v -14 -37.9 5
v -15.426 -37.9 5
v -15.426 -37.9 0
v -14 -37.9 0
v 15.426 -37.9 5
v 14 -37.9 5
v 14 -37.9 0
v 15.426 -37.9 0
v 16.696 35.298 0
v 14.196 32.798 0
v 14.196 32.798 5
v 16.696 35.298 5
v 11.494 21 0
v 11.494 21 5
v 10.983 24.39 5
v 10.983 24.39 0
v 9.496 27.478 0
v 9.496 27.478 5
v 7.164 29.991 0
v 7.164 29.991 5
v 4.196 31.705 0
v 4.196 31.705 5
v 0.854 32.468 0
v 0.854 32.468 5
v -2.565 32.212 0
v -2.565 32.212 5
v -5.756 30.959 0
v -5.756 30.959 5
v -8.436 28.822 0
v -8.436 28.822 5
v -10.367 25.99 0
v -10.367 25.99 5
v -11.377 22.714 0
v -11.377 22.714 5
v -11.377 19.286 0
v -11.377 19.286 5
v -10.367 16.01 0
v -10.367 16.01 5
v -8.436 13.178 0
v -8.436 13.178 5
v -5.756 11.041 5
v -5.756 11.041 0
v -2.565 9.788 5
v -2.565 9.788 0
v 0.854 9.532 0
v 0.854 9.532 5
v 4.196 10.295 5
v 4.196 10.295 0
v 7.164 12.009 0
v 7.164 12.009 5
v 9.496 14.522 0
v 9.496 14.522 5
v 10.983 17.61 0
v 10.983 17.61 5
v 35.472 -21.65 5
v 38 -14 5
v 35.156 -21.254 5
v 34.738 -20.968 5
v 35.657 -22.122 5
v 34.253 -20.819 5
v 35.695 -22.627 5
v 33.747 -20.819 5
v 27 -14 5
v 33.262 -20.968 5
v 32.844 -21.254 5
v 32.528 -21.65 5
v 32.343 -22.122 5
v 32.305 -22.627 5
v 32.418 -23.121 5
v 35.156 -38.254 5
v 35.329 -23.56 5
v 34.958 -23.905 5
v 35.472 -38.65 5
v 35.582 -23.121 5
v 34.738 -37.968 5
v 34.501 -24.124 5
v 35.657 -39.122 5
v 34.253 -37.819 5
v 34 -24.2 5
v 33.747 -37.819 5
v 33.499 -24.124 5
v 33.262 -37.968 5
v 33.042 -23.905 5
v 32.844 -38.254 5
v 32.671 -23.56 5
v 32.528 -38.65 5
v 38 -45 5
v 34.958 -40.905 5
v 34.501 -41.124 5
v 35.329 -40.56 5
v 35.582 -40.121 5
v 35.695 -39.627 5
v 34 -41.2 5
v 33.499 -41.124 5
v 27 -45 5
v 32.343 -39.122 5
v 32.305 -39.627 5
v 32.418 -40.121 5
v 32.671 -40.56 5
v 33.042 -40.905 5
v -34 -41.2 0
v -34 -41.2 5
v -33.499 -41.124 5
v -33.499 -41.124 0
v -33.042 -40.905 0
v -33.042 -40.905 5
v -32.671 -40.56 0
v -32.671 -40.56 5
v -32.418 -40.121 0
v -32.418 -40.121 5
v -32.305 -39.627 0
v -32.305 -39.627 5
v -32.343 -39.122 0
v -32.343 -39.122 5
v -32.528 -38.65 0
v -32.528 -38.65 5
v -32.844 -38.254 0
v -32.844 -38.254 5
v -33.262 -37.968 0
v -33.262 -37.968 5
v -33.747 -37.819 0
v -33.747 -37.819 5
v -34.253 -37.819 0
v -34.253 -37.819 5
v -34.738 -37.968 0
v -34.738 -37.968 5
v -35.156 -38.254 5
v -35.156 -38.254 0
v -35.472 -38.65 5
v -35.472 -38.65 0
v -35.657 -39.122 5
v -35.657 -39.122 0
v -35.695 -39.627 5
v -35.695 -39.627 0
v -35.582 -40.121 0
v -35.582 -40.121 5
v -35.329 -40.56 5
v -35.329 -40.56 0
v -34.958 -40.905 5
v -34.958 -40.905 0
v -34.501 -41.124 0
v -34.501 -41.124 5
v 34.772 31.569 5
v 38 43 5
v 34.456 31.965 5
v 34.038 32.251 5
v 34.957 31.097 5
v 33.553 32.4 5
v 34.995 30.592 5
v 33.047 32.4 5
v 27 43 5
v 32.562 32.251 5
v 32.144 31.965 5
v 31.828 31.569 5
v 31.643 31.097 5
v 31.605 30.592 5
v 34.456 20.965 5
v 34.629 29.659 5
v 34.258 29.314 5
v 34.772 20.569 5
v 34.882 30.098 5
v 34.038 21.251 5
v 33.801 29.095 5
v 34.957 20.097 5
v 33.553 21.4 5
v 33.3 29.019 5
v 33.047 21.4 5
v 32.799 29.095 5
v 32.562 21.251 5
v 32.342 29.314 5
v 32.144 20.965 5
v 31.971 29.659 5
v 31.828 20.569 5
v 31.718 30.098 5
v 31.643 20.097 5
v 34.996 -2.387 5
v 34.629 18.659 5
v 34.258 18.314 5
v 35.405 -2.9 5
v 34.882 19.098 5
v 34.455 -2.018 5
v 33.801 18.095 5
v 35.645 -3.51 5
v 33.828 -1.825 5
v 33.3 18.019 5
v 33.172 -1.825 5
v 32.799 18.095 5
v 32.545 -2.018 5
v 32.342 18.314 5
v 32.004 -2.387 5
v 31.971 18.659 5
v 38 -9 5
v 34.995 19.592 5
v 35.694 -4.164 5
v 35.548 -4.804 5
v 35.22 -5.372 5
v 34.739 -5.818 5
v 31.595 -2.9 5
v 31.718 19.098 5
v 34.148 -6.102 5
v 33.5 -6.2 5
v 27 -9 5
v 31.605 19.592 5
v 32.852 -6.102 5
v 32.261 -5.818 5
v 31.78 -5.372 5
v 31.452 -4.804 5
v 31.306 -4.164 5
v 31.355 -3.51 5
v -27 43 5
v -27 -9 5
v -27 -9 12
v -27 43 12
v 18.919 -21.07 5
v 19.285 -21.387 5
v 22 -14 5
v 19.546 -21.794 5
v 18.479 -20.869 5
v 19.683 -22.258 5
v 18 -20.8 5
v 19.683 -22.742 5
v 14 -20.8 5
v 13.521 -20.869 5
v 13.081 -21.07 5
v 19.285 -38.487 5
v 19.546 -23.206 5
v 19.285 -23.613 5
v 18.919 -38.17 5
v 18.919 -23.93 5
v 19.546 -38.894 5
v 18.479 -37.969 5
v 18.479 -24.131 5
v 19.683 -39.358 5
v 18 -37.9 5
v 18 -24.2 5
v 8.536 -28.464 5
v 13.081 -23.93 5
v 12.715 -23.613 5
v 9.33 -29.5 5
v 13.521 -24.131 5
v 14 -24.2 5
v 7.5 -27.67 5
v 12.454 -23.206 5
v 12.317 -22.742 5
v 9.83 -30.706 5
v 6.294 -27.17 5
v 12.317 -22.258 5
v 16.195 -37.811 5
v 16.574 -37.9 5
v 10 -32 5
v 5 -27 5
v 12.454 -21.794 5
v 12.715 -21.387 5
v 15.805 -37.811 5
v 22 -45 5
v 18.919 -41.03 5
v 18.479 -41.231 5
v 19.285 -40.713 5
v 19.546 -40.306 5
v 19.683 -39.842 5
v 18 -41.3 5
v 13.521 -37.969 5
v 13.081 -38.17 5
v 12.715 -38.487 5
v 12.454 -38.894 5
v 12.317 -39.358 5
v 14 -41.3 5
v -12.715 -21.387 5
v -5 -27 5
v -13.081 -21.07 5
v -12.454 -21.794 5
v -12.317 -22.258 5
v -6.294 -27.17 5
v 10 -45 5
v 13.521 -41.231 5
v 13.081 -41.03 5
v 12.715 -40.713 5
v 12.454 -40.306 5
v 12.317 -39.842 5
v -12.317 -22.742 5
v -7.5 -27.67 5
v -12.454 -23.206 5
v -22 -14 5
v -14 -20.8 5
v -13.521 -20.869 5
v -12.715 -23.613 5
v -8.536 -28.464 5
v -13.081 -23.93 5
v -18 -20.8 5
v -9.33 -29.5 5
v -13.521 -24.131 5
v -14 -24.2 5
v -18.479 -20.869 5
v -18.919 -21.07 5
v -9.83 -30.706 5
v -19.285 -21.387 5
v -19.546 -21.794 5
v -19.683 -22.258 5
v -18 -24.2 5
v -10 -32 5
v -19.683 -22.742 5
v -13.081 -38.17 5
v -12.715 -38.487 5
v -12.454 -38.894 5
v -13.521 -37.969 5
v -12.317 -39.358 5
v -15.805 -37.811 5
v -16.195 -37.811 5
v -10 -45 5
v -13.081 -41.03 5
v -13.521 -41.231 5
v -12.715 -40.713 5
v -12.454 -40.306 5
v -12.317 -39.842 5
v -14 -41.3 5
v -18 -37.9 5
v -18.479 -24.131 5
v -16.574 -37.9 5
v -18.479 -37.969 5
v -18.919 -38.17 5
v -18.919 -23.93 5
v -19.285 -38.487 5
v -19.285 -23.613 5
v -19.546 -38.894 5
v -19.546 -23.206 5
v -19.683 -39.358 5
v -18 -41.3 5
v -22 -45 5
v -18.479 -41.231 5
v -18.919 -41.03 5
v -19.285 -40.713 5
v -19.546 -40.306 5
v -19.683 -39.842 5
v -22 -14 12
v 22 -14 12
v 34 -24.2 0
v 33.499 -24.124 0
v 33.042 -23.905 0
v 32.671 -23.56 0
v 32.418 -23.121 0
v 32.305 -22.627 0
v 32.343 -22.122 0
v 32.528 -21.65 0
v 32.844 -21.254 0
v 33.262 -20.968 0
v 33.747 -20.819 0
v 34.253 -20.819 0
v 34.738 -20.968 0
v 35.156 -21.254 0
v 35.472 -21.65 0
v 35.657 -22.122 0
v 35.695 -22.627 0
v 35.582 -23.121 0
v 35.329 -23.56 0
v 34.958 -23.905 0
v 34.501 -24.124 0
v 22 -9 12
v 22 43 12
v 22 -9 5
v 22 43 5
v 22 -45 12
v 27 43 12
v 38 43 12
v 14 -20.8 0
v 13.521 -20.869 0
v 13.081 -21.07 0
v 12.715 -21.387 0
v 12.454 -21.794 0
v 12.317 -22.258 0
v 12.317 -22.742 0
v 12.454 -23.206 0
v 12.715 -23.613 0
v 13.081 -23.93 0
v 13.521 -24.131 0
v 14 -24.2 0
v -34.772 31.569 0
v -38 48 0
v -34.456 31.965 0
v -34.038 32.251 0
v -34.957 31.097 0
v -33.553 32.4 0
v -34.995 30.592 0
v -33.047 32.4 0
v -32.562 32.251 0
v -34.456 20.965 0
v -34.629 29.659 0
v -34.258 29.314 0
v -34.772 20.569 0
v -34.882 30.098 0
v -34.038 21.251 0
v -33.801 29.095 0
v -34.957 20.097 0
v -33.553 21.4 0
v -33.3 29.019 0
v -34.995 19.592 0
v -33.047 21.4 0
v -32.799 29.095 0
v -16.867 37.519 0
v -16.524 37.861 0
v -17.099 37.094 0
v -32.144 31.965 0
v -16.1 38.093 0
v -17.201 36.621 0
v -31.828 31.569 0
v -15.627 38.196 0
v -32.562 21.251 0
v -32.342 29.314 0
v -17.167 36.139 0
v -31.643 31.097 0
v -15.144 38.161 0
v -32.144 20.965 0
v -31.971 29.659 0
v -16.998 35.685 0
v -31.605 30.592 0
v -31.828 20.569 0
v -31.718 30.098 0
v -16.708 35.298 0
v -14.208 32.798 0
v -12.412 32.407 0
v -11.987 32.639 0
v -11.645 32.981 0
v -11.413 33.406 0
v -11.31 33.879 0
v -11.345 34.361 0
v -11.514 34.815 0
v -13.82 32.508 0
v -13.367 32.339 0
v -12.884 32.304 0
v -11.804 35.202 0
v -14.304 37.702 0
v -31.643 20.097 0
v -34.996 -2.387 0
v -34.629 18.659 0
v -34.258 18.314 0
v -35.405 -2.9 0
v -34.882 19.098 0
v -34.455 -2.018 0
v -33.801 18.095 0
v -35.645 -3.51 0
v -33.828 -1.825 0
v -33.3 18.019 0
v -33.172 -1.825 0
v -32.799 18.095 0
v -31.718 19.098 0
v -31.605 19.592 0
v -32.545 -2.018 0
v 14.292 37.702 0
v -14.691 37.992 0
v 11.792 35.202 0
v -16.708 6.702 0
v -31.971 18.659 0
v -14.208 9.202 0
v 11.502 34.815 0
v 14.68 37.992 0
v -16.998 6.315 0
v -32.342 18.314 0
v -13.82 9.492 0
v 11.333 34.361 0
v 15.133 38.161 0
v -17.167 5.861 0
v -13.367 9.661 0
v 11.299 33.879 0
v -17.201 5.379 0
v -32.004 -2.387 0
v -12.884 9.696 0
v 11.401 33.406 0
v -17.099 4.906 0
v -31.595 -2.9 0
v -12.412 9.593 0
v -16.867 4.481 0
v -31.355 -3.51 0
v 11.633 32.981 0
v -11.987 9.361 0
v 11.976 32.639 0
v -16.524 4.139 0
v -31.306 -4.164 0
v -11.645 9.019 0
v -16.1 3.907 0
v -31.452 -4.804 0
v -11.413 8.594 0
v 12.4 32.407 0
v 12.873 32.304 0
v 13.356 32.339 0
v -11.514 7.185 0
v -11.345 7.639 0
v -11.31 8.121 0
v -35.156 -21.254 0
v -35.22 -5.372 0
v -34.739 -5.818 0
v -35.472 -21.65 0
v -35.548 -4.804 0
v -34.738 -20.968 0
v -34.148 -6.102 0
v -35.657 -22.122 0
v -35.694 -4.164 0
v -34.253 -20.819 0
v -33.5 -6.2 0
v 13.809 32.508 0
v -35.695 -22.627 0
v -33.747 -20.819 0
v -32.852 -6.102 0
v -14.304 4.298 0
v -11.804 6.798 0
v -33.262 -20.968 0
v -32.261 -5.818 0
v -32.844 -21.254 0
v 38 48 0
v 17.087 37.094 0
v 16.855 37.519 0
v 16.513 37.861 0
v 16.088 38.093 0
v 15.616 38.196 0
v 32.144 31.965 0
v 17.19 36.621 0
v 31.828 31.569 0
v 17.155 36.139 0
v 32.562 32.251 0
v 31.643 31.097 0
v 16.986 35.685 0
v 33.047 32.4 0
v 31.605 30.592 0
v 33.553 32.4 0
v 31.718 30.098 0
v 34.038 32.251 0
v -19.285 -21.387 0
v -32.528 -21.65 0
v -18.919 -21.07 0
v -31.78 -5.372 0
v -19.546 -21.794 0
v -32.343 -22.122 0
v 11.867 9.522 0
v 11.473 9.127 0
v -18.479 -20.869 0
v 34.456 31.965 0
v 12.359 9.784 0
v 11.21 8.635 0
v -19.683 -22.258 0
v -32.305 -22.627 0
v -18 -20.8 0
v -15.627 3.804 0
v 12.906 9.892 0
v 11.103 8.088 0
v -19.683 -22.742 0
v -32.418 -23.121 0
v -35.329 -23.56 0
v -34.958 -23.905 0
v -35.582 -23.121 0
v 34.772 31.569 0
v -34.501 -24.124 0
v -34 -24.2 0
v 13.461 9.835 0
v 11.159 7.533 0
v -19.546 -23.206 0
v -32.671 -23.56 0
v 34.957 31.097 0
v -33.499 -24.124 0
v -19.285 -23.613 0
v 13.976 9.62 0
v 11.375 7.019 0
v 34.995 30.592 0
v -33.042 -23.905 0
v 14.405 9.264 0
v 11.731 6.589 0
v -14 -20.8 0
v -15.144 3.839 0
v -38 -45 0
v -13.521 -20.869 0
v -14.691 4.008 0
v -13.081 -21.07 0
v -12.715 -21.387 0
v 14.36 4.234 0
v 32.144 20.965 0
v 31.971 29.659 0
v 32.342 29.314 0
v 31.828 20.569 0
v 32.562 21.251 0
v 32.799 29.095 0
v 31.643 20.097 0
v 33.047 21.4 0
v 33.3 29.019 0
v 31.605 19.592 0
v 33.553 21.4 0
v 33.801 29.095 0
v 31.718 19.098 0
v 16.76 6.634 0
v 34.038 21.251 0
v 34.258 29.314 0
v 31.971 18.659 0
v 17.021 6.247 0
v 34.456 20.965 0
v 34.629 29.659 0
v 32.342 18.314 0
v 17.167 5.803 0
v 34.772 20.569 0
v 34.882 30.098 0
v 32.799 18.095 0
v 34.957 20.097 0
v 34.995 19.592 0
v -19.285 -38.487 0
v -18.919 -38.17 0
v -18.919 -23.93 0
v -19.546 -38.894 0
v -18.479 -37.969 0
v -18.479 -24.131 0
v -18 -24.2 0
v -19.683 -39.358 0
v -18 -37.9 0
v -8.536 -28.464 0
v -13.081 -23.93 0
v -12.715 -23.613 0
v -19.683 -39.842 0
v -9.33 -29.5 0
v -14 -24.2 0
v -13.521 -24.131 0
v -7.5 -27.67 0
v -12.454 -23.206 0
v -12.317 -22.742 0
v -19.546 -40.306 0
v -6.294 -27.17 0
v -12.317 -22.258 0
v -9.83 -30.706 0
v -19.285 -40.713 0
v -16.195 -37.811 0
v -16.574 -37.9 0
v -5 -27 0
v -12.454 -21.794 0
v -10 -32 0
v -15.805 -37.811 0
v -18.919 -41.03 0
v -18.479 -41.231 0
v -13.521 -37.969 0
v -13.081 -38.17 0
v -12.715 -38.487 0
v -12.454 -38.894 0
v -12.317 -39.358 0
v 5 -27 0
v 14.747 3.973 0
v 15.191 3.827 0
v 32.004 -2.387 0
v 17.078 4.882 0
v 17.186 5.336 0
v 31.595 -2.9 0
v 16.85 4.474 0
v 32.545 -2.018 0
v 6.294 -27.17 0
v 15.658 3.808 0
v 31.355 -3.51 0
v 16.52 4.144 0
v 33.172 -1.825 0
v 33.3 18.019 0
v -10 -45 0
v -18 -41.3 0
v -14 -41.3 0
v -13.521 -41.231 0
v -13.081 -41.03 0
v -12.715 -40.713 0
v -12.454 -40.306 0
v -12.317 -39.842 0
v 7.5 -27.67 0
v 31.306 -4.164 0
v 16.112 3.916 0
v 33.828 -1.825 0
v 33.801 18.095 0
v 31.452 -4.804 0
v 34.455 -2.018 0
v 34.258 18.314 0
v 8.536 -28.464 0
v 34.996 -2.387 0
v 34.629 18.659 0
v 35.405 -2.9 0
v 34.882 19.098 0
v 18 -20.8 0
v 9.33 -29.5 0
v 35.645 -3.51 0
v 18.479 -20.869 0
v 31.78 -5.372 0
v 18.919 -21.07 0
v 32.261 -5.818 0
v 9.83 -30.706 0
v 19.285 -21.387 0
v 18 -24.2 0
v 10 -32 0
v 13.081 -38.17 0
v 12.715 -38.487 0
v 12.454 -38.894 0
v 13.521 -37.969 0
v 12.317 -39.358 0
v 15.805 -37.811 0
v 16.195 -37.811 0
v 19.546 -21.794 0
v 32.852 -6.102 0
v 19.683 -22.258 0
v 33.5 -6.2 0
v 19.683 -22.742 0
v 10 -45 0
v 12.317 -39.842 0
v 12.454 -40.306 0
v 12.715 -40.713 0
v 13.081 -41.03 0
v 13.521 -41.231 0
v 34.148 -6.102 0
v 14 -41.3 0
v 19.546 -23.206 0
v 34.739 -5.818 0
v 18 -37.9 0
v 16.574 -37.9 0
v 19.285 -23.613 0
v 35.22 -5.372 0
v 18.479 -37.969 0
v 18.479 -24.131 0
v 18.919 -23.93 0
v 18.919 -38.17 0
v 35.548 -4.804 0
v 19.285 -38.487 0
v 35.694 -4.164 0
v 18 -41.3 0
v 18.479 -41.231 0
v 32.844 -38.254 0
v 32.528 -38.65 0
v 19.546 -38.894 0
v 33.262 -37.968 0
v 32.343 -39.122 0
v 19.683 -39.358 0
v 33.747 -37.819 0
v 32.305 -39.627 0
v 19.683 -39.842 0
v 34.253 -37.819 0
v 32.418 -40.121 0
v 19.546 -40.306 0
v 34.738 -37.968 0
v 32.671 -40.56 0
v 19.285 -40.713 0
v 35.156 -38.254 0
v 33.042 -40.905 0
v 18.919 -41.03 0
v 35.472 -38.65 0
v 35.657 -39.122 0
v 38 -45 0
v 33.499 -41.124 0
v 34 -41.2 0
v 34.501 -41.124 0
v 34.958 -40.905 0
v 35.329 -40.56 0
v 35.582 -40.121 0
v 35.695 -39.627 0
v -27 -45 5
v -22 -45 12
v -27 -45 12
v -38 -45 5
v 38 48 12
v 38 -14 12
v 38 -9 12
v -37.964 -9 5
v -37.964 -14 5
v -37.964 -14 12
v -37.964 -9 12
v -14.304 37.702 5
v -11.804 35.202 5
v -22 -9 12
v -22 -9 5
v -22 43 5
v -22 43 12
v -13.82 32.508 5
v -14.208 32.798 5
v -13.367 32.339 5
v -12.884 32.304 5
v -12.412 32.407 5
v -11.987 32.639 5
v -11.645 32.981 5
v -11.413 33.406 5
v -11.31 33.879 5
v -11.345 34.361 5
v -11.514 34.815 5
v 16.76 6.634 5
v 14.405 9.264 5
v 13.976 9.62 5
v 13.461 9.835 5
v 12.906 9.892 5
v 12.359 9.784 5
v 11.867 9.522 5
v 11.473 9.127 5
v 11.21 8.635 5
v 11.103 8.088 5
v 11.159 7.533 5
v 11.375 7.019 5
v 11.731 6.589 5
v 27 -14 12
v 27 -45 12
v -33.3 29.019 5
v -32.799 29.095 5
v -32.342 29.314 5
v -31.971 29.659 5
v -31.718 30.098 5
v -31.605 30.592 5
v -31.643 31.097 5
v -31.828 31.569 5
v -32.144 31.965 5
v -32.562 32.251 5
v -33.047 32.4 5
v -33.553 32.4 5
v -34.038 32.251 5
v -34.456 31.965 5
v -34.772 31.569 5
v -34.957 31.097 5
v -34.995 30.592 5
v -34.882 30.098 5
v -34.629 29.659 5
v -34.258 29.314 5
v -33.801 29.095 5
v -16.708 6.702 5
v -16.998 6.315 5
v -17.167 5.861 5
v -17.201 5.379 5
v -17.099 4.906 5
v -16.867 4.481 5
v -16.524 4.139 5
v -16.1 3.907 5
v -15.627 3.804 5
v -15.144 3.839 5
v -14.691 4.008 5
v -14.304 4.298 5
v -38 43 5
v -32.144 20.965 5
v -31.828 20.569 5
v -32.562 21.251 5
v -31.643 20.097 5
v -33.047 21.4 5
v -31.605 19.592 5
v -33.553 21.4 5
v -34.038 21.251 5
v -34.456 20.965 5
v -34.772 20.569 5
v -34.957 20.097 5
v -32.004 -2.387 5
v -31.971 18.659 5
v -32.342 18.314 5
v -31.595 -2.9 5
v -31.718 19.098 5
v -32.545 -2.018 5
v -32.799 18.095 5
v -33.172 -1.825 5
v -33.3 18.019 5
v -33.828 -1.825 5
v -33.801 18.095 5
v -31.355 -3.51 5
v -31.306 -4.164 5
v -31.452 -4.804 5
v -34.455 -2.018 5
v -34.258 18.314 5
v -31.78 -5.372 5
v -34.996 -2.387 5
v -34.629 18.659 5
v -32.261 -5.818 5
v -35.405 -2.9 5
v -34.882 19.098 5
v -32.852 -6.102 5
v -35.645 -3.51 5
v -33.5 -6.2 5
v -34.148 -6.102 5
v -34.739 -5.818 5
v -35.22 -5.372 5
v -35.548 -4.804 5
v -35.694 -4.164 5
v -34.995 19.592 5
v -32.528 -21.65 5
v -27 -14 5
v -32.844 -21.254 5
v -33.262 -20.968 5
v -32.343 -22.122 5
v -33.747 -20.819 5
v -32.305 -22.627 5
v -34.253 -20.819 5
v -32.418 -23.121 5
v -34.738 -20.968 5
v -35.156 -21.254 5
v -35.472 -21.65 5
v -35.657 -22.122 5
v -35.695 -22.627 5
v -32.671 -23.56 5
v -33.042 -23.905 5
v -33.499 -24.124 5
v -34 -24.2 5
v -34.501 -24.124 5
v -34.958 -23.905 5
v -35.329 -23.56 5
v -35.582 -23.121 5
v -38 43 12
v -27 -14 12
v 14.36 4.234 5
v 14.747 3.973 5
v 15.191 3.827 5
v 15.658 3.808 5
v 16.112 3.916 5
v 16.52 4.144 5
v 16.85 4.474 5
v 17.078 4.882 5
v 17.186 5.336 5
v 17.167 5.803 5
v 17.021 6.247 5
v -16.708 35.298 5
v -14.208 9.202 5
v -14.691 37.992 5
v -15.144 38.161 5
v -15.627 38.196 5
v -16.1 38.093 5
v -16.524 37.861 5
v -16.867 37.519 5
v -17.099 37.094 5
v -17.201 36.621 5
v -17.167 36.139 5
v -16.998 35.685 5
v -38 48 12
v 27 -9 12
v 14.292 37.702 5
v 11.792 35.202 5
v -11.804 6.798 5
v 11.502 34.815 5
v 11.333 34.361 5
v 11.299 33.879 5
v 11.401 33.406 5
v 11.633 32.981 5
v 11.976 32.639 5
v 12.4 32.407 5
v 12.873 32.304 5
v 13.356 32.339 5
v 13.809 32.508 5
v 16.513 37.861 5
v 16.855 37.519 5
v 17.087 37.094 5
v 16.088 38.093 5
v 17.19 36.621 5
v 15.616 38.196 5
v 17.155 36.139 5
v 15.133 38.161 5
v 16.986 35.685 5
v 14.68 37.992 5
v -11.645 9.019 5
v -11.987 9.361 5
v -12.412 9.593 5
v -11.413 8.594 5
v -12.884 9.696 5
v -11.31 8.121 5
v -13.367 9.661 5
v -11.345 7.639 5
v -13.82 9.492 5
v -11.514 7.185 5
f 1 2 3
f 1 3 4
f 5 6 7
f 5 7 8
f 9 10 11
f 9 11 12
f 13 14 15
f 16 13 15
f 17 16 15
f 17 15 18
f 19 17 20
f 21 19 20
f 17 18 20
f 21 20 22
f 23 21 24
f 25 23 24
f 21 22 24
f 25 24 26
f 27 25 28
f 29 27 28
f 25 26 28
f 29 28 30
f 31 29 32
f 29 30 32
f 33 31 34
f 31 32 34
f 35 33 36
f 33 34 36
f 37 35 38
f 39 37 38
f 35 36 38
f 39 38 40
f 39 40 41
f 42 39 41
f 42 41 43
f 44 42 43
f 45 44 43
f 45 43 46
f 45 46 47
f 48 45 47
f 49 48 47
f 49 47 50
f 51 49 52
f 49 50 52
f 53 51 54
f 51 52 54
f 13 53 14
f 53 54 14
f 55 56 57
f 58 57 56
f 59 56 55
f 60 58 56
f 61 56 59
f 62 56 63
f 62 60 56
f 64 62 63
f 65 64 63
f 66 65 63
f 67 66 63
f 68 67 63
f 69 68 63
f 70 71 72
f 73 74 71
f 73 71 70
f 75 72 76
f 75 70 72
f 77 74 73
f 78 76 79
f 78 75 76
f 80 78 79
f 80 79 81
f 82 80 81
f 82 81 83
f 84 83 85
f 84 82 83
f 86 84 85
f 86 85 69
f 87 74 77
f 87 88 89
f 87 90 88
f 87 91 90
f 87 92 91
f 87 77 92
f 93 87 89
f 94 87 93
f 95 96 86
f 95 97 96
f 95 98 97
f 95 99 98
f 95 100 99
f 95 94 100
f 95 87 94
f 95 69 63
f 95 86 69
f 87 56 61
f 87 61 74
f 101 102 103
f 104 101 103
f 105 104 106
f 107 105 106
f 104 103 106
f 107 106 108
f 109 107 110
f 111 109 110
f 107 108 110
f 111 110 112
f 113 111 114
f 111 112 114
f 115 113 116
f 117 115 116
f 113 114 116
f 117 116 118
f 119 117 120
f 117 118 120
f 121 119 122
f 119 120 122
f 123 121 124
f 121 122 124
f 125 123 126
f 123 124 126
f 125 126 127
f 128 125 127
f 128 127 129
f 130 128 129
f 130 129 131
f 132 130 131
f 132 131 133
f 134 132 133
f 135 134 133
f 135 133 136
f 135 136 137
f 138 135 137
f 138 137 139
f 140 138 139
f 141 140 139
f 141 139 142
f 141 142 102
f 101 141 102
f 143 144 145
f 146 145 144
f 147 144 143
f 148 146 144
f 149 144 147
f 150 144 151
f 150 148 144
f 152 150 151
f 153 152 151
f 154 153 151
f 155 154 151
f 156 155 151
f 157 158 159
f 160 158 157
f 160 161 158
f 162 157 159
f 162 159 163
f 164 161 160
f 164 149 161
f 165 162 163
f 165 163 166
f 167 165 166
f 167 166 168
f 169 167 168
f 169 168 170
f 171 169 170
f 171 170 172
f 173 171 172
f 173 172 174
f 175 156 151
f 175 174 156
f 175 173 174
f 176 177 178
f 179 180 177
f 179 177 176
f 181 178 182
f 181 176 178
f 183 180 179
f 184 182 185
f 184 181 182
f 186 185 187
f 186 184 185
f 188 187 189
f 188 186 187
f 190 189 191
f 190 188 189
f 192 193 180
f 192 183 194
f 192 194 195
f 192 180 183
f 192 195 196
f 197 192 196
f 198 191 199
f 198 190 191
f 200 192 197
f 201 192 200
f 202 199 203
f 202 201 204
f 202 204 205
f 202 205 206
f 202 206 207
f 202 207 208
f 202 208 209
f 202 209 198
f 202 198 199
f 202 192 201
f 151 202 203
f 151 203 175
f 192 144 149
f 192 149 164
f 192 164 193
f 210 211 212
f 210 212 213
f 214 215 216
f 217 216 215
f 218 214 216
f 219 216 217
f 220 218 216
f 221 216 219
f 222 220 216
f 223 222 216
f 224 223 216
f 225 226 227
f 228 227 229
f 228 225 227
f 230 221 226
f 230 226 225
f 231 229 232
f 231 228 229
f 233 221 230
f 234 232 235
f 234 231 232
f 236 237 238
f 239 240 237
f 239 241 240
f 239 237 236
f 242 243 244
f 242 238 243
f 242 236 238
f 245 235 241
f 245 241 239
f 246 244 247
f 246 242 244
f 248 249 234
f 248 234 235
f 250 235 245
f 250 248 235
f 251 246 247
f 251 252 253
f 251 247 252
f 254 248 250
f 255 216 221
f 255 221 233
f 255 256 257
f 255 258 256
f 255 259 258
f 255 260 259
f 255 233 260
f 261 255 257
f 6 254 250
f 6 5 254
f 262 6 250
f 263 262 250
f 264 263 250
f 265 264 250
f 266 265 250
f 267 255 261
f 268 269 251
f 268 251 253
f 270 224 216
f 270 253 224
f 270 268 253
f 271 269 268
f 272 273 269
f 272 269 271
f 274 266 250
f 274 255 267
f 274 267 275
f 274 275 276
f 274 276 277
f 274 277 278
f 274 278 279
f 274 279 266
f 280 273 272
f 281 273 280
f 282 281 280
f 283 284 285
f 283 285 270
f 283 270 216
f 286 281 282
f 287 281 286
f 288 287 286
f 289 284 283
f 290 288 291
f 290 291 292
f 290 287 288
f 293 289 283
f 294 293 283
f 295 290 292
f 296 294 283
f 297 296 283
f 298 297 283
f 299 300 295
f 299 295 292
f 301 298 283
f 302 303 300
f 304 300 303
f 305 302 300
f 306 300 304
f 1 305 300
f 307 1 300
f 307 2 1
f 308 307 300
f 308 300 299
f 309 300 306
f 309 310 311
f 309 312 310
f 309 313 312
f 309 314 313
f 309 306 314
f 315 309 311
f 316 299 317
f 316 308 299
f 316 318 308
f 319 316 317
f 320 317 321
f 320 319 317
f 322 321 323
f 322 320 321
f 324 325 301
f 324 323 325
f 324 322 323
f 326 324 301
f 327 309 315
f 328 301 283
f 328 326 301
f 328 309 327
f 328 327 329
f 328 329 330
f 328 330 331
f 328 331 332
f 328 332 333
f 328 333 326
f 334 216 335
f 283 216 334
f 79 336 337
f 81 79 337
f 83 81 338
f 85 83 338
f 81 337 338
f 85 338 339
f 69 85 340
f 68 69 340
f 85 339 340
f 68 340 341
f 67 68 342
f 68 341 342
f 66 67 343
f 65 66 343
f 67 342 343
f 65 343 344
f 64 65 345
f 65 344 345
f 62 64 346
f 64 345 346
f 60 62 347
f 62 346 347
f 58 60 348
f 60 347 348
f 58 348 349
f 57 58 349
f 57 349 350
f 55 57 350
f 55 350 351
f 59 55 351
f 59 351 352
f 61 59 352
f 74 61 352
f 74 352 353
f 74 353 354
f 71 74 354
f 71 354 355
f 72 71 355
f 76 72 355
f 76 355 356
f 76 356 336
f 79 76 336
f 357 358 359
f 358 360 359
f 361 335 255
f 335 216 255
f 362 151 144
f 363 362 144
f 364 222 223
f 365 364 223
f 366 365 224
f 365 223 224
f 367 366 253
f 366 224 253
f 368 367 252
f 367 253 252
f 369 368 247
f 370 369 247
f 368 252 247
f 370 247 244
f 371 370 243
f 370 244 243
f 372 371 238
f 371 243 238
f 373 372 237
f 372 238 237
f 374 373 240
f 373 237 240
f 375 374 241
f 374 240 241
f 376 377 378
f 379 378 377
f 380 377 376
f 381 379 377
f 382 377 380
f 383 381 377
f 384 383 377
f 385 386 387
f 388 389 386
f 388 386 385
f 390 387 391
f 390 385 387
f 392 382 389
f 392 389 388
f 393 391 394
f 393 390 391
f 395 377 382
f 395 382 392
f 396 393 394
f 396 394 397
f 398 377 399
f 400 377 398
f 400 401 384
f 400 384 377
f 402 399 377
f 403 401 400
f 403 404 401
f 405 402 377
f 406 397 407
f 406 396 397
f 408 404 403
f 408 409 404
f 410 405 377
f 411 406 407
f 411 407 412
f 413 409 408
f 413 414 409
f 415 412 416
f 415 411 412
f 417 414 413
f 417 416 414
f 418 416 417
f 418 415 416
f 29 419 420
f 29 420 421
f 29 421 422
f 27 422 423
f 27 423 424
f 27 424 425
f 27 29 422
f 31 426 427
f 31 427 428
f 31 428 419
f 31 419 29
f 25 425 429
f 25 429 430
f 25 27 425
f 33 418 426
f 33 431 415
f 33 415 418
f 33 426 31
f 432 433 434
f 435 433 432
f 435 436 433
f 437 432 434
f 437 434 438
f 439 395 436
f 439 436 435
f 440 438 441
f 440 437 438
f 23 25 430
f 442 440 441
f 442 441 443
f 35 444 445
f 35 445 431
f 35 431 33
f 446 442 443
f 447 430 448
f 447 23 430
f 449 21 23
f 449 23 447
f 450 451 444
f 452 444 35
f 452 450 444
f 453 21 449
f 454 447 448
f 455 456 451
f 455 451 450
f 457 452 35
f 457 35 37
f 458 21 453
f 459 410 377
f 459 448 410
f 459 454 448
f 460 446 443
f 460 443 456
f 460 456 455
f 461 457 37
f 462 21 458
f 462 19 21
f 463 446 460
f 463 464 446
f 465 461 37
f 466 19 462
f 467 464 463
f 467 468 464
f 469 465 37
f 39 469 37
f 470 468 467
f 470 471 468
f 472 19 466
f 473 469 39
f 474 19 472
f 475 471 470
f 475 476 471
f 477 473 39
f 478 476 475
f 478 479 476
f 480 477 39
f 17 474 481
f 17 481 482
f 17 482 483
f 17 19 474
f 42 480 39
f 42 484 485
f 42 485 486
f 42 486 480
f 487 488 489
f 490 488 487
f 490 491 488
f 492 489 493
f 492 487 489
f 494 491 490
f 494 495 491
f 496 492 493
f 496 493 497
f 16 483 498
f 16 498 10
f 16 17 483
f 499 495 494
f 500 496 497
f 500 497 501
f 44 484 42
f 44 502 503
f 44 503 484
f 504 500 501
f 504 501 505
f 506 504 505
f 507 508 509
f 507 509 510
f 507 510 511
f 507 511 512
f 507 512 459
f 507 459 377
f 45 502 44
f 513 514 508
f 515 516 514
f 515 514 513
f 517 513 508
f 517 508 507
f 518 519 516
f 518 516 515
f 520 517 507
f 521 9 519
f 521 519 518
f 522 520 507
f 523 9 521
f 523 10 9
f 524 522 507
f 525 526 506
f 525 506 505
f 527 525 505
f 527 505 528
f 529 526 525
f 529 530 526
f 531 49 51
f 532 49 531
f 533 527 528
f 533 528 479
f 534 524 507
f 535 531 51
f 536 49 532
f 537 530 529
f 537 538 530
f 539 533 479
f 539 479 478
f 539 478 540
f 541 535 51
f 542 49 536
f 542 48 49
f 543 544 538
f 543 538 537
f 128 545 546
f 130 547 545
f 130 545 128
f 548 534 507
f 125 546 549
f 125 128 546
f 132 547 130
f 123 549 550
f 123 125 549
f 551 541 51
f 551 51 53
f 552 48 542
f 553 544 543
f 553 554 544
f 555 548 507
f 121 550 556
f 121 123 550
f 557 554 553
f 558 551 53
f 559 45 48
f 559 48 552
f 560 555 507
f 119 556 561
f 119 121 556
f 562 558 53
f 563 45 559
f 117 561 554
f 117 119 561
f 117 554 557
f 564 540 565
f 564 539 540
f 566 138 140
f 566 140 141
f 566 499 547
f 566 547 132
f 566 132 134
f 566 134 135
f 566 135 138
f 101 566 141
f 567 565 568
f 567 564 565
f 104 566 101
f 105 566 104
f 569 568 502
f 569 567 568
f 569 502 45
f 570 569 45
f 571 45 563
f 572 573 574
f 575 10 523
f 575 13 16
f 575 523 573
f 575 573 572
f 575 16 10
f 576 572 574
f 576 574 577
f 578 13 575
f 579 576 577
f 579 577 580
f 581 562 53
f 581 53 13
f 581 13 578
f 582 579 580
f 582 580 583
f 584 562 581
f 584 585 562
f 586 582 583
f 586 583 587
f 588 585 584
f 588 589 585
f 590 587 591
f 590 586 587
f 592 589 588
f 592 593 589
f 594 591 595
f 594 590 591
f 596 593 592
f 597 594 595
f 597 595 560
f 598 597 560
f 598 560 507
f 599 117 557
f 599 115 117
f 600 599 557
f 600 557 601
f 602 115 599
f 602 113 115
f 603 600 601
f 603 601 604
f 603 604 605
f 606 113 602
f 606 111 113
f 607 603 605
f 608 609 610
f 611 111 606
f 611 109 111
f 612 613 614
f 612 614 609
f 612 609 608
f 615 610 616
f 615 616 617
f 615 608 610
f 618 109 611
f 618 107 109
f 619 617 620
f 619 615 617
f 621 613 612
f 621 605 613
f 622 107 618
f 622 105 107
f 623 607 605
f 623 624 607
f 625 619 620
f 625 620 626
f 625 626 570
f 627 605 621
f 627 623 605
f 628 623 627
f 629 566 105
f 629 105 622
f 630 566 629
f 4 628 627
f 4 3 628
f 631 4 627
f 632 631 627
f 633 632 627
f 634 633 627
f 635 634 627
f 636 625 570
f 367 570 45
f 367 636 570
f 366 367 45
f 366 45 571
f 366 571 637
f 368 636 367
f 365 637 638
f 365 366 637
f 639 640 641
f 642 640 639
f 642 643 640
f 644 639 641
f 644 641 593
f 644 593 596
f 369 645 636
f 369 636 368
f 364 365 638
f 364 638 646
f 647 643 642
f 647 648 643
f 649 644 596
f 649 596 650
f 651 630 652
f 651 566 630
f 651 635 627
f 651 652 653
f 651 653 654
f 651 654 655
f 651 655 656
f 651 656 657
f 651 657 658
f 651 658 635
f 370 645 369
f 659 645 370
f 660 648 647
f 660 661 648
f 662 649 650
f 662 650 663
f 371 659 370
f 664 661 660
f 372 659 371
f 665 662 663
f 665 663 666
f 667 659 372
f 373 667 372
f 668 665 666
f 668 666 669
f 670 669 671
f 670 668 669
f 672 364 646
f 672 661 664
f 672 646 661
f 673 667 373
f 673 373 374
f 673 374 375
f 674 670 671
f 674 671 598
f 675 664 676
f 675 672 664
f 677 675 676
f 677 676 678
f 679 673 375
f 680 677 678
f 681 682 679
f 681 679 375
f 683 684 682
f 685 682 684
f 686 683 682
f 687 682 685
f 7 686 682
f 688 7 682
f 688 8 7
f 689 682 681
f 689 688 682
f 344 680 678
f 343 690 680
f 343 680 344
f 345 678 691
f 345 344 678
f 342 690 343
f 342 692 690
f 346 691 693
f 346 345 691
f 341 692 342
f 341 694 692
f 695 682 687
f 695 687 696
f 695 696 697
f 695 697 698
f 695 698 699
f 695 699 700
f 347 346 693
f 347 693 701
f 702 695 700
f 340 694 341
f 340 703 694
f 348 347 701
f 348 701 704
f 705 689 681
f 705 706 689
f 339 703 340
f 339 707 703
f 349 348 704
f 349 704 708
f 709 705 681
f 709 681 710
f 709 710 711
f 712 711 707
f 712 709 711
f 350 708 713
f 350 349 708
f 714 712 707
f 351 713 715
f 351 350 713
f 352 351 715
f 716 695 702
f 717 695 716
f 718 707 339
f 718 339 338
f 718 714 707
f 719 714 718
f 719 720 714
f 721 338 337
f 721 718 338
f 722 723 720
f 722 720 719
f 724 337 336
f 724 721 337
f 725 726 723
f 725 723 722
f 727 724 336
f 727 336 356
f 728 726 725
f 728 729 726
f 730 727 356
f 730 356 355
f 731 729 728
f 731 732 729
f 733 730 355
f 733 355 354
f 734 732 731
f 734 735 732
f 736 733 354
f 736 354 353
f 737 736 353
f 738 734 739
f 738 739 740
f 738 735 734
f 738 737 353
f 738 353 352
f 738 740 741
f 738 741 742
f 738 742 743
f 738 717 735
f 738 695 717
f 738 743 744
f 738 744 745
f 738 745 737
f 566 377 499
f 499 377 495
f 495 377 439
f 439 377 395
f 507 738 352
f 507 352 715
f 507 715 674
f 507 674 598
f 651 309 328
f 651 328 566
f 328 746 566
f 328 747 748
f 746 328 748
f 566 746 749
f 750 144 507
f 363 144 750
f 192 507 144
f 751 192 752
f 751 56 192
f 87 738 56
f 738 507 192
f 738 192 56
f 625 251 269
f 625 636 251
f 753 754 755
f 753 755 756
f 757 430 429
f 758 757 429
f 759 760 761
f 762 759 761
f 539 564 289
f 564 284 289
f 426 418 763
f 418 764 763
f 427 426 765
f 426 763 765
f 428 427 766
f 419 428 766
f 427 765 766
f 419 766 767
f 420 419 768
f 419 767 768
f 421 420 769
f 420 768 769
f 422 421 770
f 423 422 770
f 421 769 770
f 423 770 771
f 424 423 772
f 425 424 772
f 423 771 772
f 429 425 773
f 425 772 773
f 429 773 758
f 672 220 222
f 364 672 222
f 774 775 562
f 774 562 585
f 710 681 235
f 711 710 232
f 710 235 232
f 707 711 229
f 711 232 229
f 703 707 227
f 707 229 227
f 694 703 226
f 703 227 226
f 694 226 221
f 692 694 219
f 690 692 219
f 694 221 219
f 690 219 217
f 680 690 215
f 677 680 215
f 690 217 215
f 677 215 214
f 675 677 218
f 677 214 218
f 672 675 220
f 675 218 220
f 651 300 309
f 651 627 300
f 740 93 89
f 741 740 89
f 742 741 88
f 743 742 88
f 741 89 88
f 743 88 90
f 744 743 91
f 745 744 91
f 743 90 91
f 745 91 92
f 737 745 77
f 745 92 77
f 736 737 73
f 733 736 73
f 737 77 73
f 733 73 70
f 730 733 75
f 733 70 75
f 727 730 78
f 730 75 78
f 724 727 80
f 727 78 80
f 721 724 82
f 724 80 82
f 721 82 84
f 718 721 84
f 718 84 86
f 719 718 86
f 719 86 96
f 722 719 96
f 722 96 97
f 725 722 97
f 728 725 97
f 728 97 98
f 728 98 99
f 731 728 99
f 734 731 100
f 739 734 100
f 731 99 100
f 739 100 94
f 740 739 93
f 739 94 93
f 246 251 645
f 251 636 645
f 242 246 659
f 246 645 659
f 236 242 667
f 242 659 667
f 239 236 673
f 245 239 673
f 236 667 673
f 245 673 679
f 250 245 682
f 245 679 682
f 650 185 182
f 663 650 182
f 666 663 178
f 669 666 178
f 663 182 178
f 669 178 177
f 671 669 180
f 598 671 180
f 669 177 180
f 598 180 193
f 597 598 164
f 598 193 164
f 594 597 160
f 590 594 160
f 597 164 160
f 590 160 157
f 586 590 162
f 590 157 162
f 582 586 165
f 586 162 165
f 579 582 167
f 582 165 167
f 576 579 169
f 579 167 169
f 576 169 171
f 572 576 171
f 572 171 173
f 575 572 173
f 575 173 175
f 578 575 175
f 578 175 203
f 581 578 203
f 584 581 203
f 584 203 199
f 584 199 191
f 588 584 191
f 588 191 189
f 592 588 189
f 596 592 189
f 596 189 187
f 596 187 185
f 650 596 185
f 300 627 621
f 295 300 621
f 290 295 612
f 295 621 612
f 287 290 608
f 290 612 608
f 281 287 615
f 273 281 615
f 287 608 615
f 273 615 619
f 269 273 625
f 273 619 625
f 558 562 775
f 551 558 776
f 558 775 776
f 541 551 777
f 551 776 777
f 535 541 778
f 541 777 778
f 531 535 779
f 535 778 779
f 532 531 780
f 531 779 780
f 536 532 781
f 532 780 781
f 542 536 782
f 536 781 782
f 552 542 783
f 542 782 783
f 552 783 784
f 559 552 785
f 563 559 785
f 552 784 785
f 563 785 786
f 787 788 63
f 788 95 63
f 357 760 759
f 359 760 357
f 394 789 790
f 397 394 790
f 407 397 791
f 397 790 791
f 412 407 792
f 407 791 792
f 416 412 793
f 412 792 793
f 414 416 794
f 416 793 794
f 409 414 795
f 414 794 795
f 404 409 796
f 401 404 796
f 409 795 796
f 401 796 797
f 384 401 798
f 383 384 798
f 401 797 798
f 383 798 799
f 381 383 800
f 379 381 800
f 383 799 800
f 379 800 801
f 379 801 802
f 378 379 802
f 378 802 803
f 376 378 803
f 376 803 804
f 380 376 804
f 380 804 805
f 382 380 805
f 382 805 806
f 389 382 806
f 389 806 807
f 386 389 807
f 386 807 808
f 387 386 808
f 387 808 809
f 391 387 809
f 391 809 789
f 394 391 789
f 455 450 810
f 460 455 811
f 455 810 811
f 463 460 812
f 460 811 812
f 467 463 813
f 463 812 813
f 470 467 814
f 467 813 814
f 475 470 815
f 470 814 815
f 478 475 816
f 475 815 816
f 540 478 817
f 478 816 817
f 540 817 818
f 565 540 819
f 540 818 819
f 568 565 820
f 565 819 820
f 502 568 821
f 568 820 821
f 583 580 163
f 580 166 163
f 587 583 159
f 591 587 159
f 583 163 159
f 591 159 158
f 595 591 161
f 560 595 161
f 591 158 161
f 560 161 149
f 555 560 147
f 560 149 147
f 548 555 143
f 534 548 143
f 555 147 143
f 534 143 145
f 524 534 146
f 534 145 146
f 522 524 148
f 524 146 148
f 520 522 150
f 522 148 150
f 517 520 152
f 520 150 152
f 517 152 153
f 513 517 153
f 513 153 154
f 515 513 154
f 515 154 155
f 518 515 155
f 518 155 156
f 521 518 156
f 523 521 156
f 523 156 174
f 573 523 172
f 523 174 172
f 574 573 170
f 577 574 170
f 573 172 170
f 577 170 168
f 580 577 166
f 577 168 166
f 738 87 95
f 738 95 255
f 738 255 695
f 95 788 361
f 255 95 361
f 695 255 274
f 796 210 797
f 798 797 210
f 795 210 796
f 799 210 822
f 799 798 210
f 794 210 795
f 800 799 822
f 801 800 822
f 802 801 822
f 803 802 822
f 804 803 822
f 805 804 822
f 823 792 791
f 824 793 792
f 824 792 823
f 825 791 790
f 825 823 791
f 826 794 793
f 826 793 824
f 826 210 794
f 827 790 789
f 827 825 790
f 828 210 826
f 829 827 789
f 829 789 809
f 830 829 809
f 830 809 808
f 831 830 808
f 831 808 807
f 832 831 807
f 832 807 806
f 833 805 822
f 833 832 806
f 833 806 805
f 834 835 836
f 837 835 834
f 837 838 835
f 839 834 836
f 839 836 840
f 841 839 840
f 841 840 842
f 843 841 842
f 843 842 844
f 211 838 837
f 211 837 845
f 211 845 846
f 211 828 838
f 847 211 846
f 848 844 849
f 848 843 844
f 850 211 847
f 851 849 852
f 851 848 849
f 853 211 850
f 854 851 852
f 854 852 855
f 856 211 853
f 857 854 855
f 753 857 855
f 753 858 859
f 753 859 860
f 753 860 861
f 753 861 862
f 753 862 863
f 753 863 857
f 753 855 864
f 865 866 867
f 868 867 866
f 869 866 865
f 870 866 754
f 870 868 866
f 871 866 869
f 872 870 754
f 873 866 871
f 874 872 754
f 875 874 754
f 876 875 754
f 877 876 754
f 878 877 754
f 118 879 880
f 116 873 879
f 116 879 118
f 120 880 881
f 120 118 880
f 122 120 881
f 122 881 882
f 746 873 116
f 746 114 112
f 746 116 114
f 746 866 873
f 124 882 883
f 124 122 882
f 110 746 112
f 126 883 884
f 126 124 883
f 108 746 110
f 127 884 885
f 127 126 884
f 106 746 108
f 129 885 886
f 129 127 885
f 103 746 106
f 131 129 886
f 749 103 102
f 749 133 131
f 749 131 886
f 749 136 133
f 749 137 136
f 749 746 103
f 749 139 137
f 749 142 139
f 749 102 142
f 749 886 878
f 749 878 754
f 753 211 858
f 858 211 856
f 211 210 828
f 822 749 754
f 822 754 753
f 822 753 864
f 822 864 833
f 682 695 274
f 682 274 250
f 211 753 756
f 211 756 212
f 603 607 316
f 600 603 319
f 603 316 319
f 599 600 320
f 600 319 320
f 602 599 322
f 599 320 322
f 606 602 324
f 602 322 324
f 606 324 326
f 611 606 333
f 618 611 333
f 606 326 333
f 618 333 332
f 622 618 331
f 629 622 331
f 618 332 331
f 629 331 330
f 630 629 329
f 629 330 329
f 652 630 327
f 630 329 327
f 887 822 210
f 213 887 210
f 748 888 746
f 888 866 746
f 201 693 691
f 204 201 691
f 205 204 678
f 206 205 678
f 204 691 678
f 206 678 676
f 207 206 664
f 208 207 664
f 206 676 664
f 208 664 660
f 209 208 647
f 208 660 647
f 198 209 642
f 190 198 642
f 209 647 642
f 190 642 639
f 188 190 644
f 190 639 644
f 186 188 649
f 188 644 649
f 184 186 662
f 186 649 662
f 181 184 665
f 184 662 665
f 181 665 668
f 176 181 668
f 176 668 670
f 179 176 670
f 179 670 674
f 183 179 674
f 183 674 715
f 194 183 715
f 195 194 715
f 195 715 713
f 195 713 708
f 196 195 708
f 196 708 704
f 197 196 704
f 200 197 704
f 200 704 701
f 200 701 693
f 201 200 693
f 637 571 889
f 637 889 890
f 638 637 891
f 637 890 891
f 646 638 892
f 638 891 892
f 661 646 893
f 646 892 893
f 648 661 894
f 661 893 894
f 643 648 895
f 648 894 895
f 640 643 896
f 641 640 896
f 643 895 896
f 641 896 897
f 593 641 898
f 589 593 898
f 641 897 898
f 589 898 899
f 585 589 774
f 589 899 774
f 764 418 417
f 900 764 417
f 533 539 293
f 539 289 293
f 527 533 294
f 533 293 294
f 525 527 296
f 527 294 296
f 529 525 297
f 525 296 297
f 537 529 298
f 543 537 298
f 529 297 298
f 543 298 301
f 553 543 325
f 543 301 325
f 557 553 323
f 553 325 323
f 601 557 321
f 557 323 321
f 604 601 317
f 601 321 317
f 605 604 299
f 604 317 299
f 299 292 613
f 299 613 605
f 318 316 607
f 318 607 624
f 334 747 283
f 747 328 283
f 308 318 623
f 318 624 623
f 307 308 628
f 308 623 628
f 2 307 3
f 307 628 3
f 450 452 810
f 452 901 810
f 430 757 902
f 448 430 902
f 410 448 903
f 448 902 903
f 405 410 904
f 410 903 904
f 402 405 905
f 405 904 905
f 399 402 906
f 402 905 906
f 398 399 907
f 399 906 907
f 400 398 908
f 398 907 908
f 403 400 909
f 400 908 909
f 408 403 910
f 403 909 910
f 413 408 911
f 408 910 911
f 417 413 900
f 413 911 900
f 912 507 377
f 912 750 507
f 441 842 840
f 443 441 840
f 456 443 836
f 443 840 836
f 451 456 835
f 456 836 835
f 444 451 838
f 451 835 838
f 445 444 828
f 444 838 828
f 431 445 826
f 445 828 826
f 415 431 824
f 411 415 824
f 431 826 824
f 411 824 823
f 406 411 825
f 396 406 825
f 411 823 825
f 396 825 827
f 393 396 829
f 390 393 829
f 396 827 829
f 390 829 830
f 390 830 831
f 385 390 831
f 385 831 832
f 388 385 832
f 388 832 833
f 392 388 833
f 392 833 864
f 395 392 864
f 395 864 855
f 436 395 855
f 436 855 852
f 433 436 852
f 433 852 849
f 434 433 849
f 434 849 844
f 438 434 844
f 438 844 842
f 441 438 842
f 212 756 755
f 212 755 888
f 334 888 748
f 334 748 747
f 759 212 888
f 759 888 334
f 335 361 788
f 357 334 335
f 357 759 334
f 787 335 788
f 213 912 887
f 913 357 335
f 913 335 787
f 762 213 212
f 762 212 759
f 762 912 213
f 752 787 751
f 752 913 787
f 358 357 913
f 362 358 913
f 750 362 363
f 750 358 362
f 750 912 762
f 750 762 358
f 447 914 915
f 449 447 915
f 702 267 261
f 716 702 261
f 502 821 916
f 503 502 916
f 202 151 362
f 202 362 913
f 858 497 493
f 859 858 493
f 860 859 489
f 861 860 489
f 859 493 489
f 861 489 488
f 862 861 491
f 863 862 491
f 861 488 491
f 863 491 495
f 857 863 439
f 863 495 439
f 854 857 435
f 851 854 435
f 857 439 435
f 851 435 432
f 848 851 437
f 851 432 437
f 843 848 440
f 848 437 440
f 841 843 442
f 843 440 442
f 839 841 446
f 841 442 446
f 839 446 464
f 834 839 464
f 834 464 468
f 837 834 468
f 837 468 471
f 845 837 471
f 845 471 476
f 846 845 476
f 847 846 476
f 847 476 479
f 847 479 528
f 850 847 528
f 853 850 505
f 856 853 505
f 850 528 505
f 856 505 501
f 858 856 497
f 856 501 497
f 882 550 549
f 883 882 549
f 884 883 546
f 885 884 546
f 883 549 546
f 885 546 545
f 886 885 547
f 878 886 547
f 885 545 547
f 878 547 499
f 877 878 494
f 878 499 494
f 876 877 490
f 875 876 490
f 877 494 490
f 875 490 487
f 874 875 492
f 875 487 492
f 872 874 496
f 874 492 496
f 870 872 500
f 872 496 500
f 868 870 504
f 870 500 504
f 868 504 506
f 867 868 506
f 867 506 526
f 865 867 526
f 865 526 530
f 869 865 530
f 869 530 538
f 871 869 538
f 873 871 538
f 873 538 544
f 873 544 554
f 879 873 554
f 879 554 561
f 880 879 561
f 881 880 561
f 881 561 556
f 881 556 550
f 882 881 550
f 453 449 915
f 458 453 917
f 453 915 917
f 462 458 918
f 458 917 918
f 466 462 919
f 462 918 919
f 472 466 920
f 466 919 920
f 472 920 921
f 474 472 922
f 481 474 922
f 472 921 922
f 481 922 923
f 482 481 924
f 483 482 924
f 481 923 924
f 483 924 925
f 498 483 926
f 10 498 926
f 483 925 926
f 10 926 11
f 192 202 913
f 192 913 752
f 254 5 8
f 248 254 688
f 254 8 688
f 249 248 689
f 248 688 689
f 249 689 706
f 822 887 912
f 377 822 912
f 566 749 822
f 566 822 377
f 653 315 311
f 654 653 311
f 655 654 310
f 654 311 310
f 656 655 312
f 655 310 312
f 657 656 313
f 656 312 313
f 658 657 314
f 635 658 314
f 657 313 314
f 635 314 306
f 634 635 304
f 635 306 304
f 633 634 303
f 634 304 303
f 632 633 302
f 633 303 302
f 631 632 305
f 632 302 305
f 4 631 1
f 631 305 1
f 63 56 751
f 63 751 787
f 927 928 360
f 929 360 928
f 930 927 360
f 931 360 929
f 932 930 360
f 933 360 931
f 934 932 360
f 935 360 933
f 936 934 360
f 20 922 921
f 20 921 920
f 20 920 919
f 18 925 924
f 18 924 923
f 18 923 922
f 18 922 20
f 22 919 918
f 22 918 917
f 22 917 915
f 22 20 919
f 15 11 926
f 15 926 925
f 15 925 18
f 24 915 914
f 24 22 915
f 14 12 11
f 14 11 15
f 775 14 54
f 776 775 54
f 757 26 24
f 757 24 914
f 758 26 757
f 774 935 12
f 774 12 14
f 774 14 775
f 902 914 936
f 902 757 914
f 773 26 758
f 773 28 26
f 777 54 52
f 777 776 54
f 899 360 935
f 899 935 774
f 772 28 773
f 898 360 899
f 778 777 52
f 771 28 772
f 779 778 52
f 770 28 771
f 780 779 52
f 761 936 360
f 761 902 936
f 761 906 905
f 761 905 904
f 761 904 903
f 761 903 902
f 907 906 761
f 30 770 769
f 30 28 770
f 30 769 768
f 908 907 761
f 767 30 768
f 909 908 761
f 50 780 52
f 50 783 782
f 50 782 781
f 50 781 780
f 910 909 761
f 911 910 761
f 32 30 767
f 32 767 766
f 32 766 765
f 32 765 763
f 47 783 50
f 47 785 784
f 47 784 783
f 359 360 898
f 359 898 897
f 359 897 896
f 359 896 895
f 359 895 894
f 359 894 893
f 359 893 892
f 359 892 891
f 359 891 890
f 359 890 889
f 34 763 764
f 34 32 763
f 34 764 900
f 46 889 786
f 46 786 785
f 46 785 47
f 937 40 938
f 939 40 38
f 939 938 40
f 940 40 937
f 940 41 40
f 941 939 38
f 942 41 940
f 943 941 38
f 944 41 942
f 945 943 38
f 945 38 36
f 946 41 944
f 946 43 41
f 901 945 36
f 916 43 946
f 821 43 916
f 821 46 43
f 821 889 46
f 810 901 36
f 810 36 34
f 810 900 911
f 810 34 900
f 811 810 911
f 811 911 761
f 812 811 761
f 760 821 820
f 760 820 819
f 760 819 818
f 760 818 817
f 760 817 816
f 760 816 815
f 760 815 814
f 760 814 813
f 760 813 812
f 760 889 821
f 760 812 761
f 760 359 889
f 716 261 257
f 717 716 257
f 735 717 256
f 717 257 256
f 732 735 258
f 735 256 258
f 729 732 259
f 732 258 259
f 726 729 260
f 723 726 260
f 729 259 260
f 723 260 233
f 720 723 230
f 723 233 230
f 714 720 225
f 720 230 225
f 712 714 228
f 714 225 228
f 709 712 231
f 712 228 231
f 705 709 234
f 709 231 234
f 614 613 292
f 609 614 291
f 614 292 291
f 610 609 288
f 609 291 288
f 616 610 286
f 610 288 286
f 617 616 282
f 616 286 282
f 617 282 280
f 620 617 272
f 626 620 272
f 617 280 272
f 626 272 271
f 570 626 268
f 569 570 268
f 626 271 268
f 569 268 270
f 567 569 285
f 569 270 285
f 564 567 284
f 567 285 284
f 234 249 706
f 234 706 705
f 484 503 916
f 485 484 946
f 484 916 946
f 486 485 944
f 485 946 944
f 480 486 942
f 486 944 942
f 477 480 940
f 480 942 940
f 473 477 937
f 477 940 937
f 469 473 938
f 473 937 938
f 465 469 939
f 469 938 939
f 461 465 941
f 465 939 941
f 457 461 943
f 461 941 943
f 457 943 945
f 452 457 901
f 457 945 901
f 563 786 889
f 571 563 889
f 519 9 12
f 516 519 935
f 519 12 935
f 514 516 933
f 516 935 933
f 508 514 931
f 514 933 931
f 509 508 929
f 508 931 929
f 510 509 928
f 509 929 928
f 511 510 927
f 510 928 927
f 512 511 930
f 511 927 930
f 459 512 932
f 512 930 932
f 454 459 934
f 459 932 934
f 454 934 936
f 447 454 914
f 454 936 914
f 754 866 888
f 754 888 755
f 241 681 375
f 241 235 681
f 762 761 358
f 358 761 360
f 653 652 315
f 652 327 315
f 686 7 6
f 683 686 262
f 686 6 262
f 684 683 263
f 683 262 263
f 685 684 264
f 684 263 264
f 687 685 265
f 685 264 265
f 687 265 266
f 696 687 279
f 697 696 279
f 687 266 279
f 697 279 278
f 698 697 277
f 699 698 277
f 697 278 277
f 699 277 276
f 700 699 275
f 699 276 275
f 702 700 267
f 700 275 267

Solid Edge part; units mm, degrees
sketch "Sketch1" plane through (0, 0, 0) normal (0, -1, 0) x (1, 0, 0)
  line L0 (-38, 0) -> (38, 0)
  line L1 (38, 0) -> (38, 5)
  line L2 (38, 5) -> (-38, 5)
  line L3 (-38, 5) -> (-38, 0)
  dimension "D1" = 72
  dimension "D2" = 5
  dimension "D3" = 76
extrude "Protrusion1" add sketch "Sketch1" against normal blind 62
sketch "Sketch2" plane through (0, 30, 5) normal (0, 0, 1) x (-1, 0, 0)
  circle A0 centre (-12.5, -23) radius 2.2
  circle A1 centre (12.5, -23) radius 2.2
  circle A2 centre (33.5, -23) radius 2.2
  circle A3 centre (-33.5, -23) radius 2.2
  dimension "D1" = 4.4
  dimension "D2" = 4.4
  dimension "D3" = 4.4
  dimension "D4" = 4.4
extrude "ExtrudedCutout_3" cut sketch "Sketch2" against normal blind 110
sketch "Sketch3" plane through (0, 30, 5) normal (0, 0, 1) x (0, 1, 0)
  line L0 (-30, 22) -> (32, 22)
  line L1 (32, 22) -> (32, 27)
  line L2 (-30, 27) -> (32, 27)
  line L3 (-30, 22) -> (-30, 27)
  dimension "D1" = 1
  dimension "D2" = 5
extrude "ExtrudedProtrusion_4" add sketch "Sketch3" along normal blind 5
mirror "Mirror1" about plane through (0, 0, 0) normal (1, 0, 0) of "ExtrudedProtrusion_4"
sketch "Sketch4" plane through (0, 30, 5) normal (0, 0, 1) x (-1, 0, 0)
  line L0 (38, -13) -> (-38, -13)
  line L1 (-38, -18) -> (-38, -13)
  line L2 (38, -18) -> (-38, -18)
  line L3 (38, -18) -> (38, -13)
  dimension "D1" = 1
  dimension "D2" = 5
extrude "ExtrudedProtrusion_6" add sketch "Sketch4" along normal blind 7
sketch "Sketch5" plane through (0, 21.5, 5) normal (0, 0, 1) x (1, 0, 0)
  line L0 (-14.3036, 16.2021) -> (-11.8036, 13.7021)
  arc A0 (-11.8036, 13.7021) -> (-14.2078, 11.2979) centre (-13.0057, 12.5) cw
  line L1 (-14.2078, 11.2979) -> (-16.7078, 13.7979)
  arc A1 (-16.7078, 13.7979) -> (-14.3036, 16.2021) centre (-15.5057, 15) cw
  line L2 (-14.2078, -12.2979) -> (-16.7078, -14.7979)
  arc A2 (-14.3036, -17.2021) -> (-16.7078, -14.7979) centre (-15.5057, -16) cw
  line L3 (-14.3036, -17.2021) -> (-11.8036, -14.7021)
  arc A3 (-14.2078, -12.2979) -> (-11.8036, -14.7021) centre (-13.0057, -13.5) cw
  line L4 (11.7306, -14.9106) -> (14.3599, -17.2662)
  arc A4 (16.7605, -14.8656) -> (14.3599, -17.2662) centre (15.4943, -16) cw
  line L5 (14.4048, -12.2363) -> (16.7605, -14.8656)
  arc A5 (11.7306, -14.9106) -> (14.4048, -12.2363) centre (12.9943, -13.5) cw
  line L6 (14.2922, 16.2021) -> (11.7922, 13.7021)
  arc A6 (14.1964, 11.2979) -> (11.7922, 13.7021) centre (12.9943, 12.5) cw
  line L7 (14.1964, 11.2979) -> (16.6964, 13.7979)
  arc A7 (14.2922, 16.2021) -> (16.6964, 13.7979) centre (15.4943, 15) cw
  circle A8 centre (-0.0057, -0.5) radius 11.5
  dimension "D1" = 23
  dimension "D2" = 12
  dimension "D3" = 16
  dimension "D4" = 15.5
  dimension "D5" = 3.4
  dimension "D6" = 3.4
  dimension "D7" = 3.4
  dimension "D8" = 3.4
  dimension "D9" = 42
  dimension "D10" = 42
extrude "Cutout1" cut sketch "Sketch5" against normal through all
sketch "Sketch6" plane through (32.5, 21.5, 5) normal (0, 0, 1) x (0, -1, 0)
  line L0 (21.5, 5.5) -> (66.5, 5.5)
  line L1 (66.5, 5.5) -> (66.5, -70.5)
  line L2 (66.5, -70.5) -> (21.5, -70.5)
  line L3 (21.5, -70.5) -> (21.5, 5.5)
  dimension "D1" = 45
extrude "Protrusion3" add sketch "Sketch6" against normal up to vertex (5 mm away)
sketch "Sketch7" plane through (0, 9.5, 5) normal (0, 0, 1) x (0, -1, 0)
  circle A0 centre (49, -34) radius 1.7
  circle A1 centre (49, 34) radius 1.7
  dimension "D1" = 49
  dimension "D2" = 49
extrude "ExtrudedCutout_9" cut sketch "Sketch7" against normal blind 143.3279
sketch "Sketch8" plane through (0, 19, 0) normal (0, 0, -1) x (0, -1, 0)
  circle A0 centre (58.5, 16) radius 1.7
  dimension "D1" = 9
extrude "ExtrudedCutout_10" cut sketch "Sketch8" against normal blind 316.0197
mirror "Mirror2" about plane through (0, 0, 0) normal (1, 0, 0) of "ExtrudedCutout_10"
sketch "Sketch9" plane through (0, 19, 0) normal (0, 0, -1) x (0, -1, 0)
  circle A0 centre (41.5, 16) radius 1.7
  circle A1 centre (41.5, -16) radius 1.7
  circle A2 centre (41.5, -34) radius 1.7
  circle A3 centre (41.5, 34) radius 1.7
  dimension "D1" = 17
  dimension "D2" = 17
extrude "ExtrudedCutout_11" cut sketch "Sketch9" against normal blind 37.4845
sketch "Sketch10" plane through (0, 55, 5) normal (0, 0, 1) x (0, -1, 0)
  line L0 (-7, 38) -> (7, 38)
  line L1 (7, 38) -> (7, -51.7338)
  line L2 (7, -51.7338) -> (-7, -51.7338)
  line L3 (-7, -51.7338) -> (-7, 38)
extrude "ExtrudedCutout_12" cut sketch "Sketch10" against normal blind 91.7973 and the other way blind 101.9208
sketch "Sketch11" plane through (0, 6.15, 0) normal (0, 0, -1) x (0, -1, 0)
  circle A0 centre (10.15, -33.5) radius 2.2
  circle A1 centre (10.15, 33.5) radius 2.2
  dimension "D1" = 4.4
  dimension "D2" = 4.5
  dimension "D3" = 2.3
  dimension "D4" = 4.5
  dimension "D5" = 10
extrude "ExtrudedCutout_13" cut sketch "Sketch11" against normal blind 103.1381
sketch "Sketch12" plane through (0, 6.15, 0) normal (0, 0, -1) x (0, -1, 0)
  line L0 (51.15, 10) -> (51.15, -10)
  line L1 (51.15, -10) -> (38.15, -10)
  arc A0 (33.15, -5) -> (38.15, -10) centre (38.15, -5) ccw
  line L2 (33.15, -5) -> (33.15, 5)
  arc A1 (38.15, 10) -> (33.15, 5) centre (38.15, 5) ccw
  line L3 (38.15, 10) -> (51.15, 10)
  dimension "D1" = 28
  dimension "D2" = 28
  dimension "D3" = 18
  dimension "D4" = 5
  dimension "D5" = 5
extrude "ExtrudedCutout_15" cut sketch "Sketch12" against normal blind 370.0743
sketch "Sketch13" plane through (0, -1, 5) normal (0, 0, 1) x (0, -1, 0)
  line L0 (-1, 27) -> (-1, 22)
  line L1 (-1, 22) -> (8, 22)
  line L2 (8, -22) -> (8, 22)
  line L3 (8, -22) -> (-1, -22)
  line L4 (-1, -22) -> (-1, -27)
  line L5 (-1, -27) -> (8, -27)
  line L6 (8, -37.9639) -> (8, -27)
  line L7 (13, -37.9639) -> (8, -37.9639)
  line L8 (13, -27) -> (13, -37.9639)
  line L9 (13, -27) -> (44, -27)
  line L10 (44, -27) -> (44, -22)
  line L11 (44, -22) -> (13, -22)
  line L12 (13, 22) -> (13, -22)
  line L13 (13, 22) -> (44, 22)
  line L14 (44, 22) -> (44, 27)
  line L15 (44, 27) -> (13, 27)
  line L16 (13, 38) -> (13, 27)
  line L17 (8, 38) -> (13, 38)
  line L18 (8, 27) -> (8, 38)
  line L19 (8, 27) -> (-1, 27)
  dimension "D1" = 5
  dimension "D2" = 5
  dimension "D3" = 5
  dimension "D4" = 36
  dimension "D5" = 5
extrude "ExtrudedProtrusion_8" add sketch "Sketch13" along normal blind 7
sketch "Sketch14" plane through (-24.5, 21.5, 10) normal (0, 0, 1) x (0, -1, 0)
  line L0 (21.5, 51.5) -> (-21.5, 51.5)
  line L1 (-21.5, 46.5) -> (-21.5, 51.5)
  line L2 (-21.5, 46.5) -> (21.5, 46.5)
  line L3 (21.5, 51.5) -> (21.5, 46.5)
  line L4 (21.5, -2.5) -> (-21.5, -2.5)
  line L5 (-21.5, 2.5) -> (-21.5, -2.5)
  line L6 (-21.5, 2.5) -> (21.5, 2.5)
  line L7 (21.5, -2.5) -> (21.5, 2.5)
extrude "ExtrudedProtrusion_9" add sketch "Sketch14" along normal blind 2
sketch "Sketch15" plane through (0, -29.5, 5) normal (0, 0, 1) x (0, -1, 0)
  line L0 (-8.7, -16) -> (-8.7, -18)
  arc A0 (-8.7, -18) -> (-5.3, -18) centre (-7, -18) ccw
  line L1 (-5.3, -16) -> (-5.3, -18)
  line L2 (-5.3, -14) -> (-5.3, -16)
  arc A1 (-8.7, -14) -> (-5.3, -14) centre (-7, -14) cw
  line L3 (-8.7, -14) -> (-8.7, -16)
  line L4 (-8.7, 18) -> (-8.7, 14)
  arc A2 (-8.7, 14) -> (-5.3, 14) centre (-7, 14) ccw
  line L5 (-5.3, 18) -> (-5.3, 14)
  arc A3 (-8.7, 18) -> (-5.3, 18) centre (-7, 18) cw
  dimension "D1" = 2
  dimension "D2" = 2
  dimension "D3" = 2
  dimension "D4" = 2
  dimension "D5" = 24.2
extrude "ExtrudedCutout_16" cut sketch "Sketch15" against normal blind 2209.1975
mirror "Mirror3" about plane through (24, -36.5, 6) normal (0, -1, 0) of "ExtrudedCutout_16"
mirror "Mirror4" about plane through (24, -31.05, 6) normal (0, -1, 0) of "ExtrudedCutout_16"
sketch "Sketch16" plane through (32.5, 17, 5) normal (0, 0, 1) x (0, -1, 0)
  circle A0 centre (-2.7191, 0.8) radius 1.7
  circle A1 centre (-13.7191, 0.8) radius 1.7
  dimension "D1" = 3
  dimension "D2" = 3
  dimension "D3" = 11
extrude "Cutout4" cut sketch "Sketch16" against normal blind 130.0202
mirror "Mirror5" about plane through (0, 1.5, 6) normal (-1, 0, 0) of "Cutout4"
properties material "ABS Plastic, medium impact"
